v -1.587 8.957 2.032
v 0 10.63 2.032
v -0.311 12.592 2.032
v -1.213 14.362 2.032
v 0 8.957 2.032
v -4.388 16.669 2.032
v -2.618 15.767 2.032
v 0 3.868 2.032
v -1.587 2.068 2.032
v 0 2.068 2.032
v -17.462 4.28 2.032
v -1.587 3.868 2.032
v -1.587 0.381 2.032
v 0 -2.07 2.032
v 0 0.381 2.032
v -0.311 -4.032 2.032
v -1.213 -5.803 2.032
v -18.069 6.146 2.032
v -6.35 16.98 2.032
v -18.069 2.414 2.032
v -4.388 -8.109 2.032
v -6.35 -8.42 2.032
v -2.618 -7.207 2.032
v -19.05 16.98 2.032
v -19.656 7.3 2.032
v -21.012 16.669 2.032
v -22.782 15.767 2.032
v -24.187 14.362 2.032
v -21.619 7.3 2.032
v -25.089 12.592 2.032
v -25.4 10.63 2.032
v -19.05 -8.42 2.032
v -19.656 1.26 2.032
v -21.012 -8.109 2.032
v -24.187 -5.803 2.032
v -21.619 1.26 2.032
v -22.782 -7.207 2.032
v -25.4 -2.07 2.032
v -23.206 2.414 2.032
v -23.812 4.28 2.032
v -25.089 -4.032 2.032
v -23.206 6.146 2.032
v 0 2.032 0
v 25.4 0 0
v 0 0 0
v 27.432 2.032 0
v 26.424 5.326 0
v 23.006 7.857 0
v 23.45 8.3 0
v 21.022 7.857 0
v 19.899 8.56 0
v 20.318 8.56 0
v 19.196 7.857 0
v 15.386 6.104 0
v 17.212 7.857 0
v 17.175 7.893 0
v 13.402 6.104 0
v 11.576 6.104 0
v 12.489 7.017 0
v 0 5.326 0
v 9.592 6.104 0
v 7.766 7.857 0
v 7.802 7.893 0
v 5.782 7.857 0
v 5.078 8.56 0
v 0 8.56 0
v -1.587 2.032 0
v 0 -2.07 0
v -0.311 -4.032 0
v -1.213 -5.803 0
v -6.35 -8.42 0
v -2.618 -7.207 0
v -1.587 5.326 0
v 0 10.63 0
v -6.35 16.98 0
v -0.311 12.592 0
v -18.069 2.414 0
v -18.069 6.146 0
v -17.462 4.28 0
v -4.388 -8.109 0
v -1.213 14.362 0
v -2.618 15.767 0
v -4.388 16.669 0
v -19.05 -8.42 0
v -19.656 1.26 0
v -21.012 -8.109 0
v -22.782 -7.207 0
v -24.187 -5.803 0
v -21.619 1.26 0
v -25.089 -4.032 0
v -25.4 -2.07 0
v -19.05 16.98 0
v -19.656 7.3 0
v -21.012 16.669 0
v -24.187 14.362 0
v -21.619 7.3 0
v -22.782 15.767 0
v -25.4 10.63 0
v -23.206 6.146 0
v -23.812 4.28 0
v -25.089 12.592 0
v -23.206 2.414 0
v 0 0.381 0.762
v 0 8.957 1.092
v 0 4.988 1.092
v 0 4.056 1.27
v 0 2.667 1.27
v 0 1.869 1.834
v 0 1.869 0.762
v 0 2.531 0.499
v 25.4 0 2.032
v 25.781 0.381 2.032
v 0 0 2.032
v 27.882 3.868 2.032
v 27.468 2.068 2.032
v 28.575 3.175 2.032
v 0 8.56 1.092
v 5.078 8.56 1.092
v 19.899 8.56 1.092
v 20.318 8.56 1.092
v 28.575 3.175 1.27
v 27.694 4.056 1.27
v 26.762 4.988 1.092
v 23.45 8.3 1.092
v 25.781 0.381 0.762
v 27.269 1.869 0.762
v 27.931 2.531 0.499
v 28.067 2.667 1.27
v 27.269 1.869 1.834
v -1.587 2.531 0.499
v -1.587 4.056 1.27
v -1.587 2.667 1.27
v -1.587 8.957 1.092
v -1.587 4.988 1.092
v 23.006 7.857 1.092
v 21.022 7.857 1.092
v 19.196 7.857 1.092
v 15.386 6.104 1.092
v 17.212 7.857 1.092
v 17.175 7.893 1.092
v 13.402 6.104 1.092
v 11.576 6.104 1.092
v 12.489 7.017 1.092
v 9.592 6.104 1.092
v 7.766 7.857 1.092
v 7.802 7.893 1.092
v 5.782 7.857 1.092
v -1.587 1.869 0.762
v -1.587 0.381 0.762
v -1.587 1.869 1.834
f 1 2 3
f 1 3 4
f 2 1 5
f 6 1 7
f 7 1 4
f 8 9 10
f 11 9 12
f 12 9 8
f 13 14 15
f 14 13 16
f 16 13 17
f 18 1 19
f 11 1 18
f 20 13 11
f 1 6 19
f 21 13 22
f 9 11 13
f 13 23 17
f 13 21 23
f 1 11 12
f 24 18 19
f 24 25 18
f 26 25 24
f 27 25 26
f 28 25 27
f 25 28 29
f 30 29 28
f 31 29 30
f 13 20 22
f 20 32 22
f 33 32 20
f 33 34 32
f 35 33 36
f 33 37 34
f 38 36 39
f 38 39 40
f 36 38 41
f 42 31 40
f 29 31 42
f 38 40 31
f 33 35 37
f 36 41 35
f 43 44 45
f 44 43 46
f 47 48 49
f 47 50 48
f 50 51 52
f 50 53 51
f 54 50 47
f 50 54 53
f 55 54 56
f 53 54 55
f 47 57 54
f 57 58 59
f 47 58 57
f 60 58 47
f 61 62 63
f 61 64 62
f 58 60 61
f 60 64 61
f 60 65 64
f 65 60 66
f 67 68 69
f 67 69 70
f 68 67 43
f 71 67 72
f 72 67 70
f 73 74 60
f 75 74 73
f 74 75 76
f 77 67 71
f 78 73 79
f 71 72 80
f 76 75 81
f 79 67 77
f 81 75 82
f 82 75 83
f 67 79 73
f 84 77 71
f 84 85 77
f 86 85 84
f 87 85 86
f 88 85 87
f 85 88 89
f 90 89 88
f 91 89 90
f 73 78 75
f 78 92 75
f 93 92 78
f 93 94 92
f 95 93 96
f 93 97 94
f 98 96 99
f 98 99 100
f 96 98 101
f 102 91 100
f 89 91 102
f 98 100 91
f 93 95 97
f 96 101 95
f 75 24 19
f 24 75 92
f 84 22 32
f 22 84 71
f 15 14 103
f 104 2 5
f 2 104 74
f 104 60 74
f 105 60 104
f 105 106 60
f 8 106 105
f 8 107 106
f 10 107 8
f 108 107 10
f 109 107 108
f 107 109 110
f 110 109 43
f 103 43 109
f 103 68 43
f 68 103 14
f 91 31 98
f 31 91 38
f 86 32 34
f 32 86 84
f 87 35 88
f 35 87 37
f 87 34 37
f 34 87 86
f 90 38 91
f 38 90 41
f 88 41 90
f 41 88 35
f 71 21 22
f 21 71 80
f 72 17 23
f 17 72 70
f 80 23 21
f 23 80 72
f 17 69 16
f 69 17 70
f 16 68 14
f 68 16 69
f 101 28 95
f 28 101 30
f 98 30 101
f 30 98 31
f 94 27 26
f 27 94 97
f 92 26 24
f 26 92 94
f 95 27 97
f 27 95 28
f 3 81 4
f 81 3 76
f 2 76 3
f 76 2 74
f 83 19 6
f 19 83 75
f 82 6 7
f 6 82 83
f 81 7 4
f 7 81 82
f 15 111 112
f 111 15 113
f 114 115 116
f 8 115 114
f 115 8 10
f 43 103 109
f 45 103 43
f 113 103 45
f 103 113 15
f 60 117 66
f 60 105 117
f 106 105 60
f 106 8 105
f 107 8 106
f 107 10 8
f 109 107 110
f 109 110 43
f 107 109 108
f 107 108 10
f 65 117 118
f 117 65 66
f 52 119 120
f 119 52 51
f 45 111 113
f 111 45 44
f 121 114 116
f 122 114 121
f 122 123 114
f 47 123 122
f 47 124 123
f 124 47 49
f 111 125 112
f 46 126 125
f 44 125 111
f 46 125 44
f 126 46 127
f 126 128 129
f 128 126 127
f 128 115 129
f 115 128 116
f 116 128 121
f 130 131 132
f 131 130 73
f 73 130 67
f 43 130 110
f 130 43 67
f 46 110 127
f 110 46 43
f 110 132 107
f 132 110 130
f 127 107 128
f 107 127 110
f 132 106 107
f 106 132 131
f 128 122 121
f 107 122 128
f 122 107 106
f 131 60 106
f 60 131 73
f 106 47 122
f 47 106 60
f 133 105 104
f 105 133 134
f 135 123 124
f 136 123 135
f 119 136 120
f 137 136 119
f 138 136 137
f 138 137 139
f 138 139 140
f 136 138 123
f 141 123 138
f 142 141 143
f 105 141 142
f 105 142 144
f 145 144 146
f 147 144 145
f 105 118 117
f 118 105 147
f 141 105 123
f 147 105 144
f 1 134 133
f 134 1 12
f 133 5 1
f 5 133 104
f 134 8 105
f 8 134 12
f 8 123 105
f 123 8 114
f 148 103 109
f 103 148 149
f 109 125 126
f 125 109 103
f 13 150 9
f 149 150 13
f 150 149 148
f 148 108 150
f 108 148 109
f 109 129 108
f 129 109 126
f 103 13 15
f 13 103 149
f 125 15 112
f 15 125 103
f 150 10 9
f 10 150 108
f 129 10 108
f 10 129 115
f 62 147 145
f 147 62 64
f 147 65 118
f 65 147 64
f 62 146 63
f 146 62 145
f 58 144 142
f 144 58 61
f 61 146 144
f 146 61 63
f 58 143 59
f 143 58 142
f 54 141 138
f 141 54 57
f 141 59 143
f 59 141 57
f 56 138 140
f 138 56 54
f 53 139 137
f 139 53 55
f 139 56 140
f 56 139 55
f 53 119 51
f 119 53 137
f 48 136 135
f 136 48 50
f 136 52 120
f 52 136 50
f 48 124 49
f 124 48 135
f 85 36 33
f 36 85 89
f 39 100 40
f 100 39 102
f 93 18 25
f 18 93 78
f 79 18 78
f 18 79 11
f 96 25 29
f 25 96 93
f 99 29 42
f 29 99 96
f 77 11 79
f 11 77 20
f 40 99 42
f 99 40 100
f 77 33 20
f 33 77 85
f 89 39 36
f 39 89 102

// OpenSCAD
// Physical Keygen - by Nirav Patel <http://eclecti.cc>
//
// Generate a duplicate of a Kwikset KW1 key by editing the last line of the file
// and entering in the key code of the lock.  If you don't know the key code,
// you can measure the key and compare the numbers at:
// http://web.archive.org/web/20050217020917fw_/http://dlaco.com/spacing/tips.htm
//
// This work is licensed under a Creative Commons Attribution 3.0 Unported License.

// Since the keys and locks I have were all designed in imperial units, the
// constants in this file will be defined in inches.  The mm function
// allows us to retain the proper size for exporting a metric STL.
function mm(i) = i*25.4;

module rounded(size, r) {
    union() {
        translate([r, 0, 0]) cube([size[0]-2*r, size[1], size[2]]);
        translate([0, r, 0]) cube([size[0], size[1]-2*r, size[2]]);
        translate([r, r, 0]) cylinder(h=size[2], r=r);
        translate([size[0]-r, r, 0]) cylinder(h=size[2], r=r);
        translate([r, size[1]-r, 0]) cylinder(h=size[2], r=r);
        translate([size[0]-r, size[1]-r, 0]) cylinder(h=size[2], r=r);
    }
}

module bit() {
    w = mm(1/4);
    difference() {
        translate([-w/2, 0, 0]) cube([w, mm(1), w]);
        translate([-mm(5/128), 0, 0]) rotate([0, 0, 135]) cube([w, w, w]);
        translate([mm(5/128), 0, 0]) rotate([0, 0, -45]) cube([w, w, w]);
    }
}

// Kwikset KW1 5 pin key.  The measurements are mostly guesses based on reverse
// engineering some keys I have and some publicly available information.
module kw1(bits) {
    // You may need to adjust these to fit your specific printer settings
    thickness = mm(0.080);
    length = mm(9/8);
    width = mm(.337);
    
    shoulder = mm(.247);
    pin_spacing = mm(.15);
    depth_inc = mm(.023);
    
    // A fudge factor.  Printing with your average RepRap, the bottom layer is
    // going to be squeezed larger than you want. You can make the pins
    // go slighly deeper by a fudge amount to make up for it if you aren't
    // adjusting for it elsewhere like Skeinforge or in your firmware.
    fudge = 0.5;
    
    // Handle size
    h_l = mm(1);
    h_w = mm(1);
    h_d = mm(1/16);
    difference() {
        // blade and key handle
        union() {
            translate([-h_l, -h_w/2 + width/2, 0]) rounded([h_l, h_w, thickness], mm(1/4));
            // cut a little off the tip to avoid going too long
            cube([length, width, thickness]);
        }
        
        // chamfer the tip
        translate([length, mm(1/8), 0]) {
            rotate([0, 0, 45]) cube([10, 10, thickness]);
            rotate([0, 0, 225]) cube([10, 10, thickness]);
        }
        
        // put in a hole for keychain use
        translate([-h_l + mm(3/16), width/2, 0]) cylinder(h=thickness, r=mm(1/8));
        
        // cut the channels in the key.  designed more for printability than accuracy
        union() {
            translate([-h_d, mm(.105), mm(.025)]) rotate([225, 0, 0]) cube([length + h_d, width, width]);
            translate([-h_d, mm(.105), mm(.05)]) rotate([260, 0, 0]) cube([length + h_d, thickness/2, mm(1/32)]);
            translate([-h_d, mm(.105), 0]) cube([length + h_d, mm(7/128), mm(.05)]);
            translate([-h_d, mm(.105) + mm(7/128), mm(.05)]) rotate([225, 0, 0]) cube([length + h_d, mm(3/64), thickness]);
        }
        
        translate([-h_d, width - mm(9/64), mm(.043)]) {
            cube([length + h_d, width - (width - mm(10/64)), thickness]);
            rotate([50, 0, 0]) cube([length + h_d, width, thickness]);
        }
        
        union() {
            translate([-h_d, mm(0.015), mm(.03)]) cube([length + h_d, mm(15/256), thickness]);
            translate([-h_d, mm(0.015) + mm(13/256), thickness - mm(1/64)]) rotate([45, 0, 0]) cube([length + h_d, mm(1/16), mm(1/16)]);
        }
        
        // Do the actual bitting
        for (b = [0:4]) {
            // KW1 doesn't have a 0 value and instead has 1 start around .008" deep
            translate([shoulder + fudge + b*pin_spacing, width - mm(.008) - (bits[b] - 1)*depth_inc - fudge, 0]) bit();
        }
    }
}

// This sample key goes to a lock that is sitting disassembled on my desk
// Flip the key over for easy printing
kw1([1,4,4,1,1]);
